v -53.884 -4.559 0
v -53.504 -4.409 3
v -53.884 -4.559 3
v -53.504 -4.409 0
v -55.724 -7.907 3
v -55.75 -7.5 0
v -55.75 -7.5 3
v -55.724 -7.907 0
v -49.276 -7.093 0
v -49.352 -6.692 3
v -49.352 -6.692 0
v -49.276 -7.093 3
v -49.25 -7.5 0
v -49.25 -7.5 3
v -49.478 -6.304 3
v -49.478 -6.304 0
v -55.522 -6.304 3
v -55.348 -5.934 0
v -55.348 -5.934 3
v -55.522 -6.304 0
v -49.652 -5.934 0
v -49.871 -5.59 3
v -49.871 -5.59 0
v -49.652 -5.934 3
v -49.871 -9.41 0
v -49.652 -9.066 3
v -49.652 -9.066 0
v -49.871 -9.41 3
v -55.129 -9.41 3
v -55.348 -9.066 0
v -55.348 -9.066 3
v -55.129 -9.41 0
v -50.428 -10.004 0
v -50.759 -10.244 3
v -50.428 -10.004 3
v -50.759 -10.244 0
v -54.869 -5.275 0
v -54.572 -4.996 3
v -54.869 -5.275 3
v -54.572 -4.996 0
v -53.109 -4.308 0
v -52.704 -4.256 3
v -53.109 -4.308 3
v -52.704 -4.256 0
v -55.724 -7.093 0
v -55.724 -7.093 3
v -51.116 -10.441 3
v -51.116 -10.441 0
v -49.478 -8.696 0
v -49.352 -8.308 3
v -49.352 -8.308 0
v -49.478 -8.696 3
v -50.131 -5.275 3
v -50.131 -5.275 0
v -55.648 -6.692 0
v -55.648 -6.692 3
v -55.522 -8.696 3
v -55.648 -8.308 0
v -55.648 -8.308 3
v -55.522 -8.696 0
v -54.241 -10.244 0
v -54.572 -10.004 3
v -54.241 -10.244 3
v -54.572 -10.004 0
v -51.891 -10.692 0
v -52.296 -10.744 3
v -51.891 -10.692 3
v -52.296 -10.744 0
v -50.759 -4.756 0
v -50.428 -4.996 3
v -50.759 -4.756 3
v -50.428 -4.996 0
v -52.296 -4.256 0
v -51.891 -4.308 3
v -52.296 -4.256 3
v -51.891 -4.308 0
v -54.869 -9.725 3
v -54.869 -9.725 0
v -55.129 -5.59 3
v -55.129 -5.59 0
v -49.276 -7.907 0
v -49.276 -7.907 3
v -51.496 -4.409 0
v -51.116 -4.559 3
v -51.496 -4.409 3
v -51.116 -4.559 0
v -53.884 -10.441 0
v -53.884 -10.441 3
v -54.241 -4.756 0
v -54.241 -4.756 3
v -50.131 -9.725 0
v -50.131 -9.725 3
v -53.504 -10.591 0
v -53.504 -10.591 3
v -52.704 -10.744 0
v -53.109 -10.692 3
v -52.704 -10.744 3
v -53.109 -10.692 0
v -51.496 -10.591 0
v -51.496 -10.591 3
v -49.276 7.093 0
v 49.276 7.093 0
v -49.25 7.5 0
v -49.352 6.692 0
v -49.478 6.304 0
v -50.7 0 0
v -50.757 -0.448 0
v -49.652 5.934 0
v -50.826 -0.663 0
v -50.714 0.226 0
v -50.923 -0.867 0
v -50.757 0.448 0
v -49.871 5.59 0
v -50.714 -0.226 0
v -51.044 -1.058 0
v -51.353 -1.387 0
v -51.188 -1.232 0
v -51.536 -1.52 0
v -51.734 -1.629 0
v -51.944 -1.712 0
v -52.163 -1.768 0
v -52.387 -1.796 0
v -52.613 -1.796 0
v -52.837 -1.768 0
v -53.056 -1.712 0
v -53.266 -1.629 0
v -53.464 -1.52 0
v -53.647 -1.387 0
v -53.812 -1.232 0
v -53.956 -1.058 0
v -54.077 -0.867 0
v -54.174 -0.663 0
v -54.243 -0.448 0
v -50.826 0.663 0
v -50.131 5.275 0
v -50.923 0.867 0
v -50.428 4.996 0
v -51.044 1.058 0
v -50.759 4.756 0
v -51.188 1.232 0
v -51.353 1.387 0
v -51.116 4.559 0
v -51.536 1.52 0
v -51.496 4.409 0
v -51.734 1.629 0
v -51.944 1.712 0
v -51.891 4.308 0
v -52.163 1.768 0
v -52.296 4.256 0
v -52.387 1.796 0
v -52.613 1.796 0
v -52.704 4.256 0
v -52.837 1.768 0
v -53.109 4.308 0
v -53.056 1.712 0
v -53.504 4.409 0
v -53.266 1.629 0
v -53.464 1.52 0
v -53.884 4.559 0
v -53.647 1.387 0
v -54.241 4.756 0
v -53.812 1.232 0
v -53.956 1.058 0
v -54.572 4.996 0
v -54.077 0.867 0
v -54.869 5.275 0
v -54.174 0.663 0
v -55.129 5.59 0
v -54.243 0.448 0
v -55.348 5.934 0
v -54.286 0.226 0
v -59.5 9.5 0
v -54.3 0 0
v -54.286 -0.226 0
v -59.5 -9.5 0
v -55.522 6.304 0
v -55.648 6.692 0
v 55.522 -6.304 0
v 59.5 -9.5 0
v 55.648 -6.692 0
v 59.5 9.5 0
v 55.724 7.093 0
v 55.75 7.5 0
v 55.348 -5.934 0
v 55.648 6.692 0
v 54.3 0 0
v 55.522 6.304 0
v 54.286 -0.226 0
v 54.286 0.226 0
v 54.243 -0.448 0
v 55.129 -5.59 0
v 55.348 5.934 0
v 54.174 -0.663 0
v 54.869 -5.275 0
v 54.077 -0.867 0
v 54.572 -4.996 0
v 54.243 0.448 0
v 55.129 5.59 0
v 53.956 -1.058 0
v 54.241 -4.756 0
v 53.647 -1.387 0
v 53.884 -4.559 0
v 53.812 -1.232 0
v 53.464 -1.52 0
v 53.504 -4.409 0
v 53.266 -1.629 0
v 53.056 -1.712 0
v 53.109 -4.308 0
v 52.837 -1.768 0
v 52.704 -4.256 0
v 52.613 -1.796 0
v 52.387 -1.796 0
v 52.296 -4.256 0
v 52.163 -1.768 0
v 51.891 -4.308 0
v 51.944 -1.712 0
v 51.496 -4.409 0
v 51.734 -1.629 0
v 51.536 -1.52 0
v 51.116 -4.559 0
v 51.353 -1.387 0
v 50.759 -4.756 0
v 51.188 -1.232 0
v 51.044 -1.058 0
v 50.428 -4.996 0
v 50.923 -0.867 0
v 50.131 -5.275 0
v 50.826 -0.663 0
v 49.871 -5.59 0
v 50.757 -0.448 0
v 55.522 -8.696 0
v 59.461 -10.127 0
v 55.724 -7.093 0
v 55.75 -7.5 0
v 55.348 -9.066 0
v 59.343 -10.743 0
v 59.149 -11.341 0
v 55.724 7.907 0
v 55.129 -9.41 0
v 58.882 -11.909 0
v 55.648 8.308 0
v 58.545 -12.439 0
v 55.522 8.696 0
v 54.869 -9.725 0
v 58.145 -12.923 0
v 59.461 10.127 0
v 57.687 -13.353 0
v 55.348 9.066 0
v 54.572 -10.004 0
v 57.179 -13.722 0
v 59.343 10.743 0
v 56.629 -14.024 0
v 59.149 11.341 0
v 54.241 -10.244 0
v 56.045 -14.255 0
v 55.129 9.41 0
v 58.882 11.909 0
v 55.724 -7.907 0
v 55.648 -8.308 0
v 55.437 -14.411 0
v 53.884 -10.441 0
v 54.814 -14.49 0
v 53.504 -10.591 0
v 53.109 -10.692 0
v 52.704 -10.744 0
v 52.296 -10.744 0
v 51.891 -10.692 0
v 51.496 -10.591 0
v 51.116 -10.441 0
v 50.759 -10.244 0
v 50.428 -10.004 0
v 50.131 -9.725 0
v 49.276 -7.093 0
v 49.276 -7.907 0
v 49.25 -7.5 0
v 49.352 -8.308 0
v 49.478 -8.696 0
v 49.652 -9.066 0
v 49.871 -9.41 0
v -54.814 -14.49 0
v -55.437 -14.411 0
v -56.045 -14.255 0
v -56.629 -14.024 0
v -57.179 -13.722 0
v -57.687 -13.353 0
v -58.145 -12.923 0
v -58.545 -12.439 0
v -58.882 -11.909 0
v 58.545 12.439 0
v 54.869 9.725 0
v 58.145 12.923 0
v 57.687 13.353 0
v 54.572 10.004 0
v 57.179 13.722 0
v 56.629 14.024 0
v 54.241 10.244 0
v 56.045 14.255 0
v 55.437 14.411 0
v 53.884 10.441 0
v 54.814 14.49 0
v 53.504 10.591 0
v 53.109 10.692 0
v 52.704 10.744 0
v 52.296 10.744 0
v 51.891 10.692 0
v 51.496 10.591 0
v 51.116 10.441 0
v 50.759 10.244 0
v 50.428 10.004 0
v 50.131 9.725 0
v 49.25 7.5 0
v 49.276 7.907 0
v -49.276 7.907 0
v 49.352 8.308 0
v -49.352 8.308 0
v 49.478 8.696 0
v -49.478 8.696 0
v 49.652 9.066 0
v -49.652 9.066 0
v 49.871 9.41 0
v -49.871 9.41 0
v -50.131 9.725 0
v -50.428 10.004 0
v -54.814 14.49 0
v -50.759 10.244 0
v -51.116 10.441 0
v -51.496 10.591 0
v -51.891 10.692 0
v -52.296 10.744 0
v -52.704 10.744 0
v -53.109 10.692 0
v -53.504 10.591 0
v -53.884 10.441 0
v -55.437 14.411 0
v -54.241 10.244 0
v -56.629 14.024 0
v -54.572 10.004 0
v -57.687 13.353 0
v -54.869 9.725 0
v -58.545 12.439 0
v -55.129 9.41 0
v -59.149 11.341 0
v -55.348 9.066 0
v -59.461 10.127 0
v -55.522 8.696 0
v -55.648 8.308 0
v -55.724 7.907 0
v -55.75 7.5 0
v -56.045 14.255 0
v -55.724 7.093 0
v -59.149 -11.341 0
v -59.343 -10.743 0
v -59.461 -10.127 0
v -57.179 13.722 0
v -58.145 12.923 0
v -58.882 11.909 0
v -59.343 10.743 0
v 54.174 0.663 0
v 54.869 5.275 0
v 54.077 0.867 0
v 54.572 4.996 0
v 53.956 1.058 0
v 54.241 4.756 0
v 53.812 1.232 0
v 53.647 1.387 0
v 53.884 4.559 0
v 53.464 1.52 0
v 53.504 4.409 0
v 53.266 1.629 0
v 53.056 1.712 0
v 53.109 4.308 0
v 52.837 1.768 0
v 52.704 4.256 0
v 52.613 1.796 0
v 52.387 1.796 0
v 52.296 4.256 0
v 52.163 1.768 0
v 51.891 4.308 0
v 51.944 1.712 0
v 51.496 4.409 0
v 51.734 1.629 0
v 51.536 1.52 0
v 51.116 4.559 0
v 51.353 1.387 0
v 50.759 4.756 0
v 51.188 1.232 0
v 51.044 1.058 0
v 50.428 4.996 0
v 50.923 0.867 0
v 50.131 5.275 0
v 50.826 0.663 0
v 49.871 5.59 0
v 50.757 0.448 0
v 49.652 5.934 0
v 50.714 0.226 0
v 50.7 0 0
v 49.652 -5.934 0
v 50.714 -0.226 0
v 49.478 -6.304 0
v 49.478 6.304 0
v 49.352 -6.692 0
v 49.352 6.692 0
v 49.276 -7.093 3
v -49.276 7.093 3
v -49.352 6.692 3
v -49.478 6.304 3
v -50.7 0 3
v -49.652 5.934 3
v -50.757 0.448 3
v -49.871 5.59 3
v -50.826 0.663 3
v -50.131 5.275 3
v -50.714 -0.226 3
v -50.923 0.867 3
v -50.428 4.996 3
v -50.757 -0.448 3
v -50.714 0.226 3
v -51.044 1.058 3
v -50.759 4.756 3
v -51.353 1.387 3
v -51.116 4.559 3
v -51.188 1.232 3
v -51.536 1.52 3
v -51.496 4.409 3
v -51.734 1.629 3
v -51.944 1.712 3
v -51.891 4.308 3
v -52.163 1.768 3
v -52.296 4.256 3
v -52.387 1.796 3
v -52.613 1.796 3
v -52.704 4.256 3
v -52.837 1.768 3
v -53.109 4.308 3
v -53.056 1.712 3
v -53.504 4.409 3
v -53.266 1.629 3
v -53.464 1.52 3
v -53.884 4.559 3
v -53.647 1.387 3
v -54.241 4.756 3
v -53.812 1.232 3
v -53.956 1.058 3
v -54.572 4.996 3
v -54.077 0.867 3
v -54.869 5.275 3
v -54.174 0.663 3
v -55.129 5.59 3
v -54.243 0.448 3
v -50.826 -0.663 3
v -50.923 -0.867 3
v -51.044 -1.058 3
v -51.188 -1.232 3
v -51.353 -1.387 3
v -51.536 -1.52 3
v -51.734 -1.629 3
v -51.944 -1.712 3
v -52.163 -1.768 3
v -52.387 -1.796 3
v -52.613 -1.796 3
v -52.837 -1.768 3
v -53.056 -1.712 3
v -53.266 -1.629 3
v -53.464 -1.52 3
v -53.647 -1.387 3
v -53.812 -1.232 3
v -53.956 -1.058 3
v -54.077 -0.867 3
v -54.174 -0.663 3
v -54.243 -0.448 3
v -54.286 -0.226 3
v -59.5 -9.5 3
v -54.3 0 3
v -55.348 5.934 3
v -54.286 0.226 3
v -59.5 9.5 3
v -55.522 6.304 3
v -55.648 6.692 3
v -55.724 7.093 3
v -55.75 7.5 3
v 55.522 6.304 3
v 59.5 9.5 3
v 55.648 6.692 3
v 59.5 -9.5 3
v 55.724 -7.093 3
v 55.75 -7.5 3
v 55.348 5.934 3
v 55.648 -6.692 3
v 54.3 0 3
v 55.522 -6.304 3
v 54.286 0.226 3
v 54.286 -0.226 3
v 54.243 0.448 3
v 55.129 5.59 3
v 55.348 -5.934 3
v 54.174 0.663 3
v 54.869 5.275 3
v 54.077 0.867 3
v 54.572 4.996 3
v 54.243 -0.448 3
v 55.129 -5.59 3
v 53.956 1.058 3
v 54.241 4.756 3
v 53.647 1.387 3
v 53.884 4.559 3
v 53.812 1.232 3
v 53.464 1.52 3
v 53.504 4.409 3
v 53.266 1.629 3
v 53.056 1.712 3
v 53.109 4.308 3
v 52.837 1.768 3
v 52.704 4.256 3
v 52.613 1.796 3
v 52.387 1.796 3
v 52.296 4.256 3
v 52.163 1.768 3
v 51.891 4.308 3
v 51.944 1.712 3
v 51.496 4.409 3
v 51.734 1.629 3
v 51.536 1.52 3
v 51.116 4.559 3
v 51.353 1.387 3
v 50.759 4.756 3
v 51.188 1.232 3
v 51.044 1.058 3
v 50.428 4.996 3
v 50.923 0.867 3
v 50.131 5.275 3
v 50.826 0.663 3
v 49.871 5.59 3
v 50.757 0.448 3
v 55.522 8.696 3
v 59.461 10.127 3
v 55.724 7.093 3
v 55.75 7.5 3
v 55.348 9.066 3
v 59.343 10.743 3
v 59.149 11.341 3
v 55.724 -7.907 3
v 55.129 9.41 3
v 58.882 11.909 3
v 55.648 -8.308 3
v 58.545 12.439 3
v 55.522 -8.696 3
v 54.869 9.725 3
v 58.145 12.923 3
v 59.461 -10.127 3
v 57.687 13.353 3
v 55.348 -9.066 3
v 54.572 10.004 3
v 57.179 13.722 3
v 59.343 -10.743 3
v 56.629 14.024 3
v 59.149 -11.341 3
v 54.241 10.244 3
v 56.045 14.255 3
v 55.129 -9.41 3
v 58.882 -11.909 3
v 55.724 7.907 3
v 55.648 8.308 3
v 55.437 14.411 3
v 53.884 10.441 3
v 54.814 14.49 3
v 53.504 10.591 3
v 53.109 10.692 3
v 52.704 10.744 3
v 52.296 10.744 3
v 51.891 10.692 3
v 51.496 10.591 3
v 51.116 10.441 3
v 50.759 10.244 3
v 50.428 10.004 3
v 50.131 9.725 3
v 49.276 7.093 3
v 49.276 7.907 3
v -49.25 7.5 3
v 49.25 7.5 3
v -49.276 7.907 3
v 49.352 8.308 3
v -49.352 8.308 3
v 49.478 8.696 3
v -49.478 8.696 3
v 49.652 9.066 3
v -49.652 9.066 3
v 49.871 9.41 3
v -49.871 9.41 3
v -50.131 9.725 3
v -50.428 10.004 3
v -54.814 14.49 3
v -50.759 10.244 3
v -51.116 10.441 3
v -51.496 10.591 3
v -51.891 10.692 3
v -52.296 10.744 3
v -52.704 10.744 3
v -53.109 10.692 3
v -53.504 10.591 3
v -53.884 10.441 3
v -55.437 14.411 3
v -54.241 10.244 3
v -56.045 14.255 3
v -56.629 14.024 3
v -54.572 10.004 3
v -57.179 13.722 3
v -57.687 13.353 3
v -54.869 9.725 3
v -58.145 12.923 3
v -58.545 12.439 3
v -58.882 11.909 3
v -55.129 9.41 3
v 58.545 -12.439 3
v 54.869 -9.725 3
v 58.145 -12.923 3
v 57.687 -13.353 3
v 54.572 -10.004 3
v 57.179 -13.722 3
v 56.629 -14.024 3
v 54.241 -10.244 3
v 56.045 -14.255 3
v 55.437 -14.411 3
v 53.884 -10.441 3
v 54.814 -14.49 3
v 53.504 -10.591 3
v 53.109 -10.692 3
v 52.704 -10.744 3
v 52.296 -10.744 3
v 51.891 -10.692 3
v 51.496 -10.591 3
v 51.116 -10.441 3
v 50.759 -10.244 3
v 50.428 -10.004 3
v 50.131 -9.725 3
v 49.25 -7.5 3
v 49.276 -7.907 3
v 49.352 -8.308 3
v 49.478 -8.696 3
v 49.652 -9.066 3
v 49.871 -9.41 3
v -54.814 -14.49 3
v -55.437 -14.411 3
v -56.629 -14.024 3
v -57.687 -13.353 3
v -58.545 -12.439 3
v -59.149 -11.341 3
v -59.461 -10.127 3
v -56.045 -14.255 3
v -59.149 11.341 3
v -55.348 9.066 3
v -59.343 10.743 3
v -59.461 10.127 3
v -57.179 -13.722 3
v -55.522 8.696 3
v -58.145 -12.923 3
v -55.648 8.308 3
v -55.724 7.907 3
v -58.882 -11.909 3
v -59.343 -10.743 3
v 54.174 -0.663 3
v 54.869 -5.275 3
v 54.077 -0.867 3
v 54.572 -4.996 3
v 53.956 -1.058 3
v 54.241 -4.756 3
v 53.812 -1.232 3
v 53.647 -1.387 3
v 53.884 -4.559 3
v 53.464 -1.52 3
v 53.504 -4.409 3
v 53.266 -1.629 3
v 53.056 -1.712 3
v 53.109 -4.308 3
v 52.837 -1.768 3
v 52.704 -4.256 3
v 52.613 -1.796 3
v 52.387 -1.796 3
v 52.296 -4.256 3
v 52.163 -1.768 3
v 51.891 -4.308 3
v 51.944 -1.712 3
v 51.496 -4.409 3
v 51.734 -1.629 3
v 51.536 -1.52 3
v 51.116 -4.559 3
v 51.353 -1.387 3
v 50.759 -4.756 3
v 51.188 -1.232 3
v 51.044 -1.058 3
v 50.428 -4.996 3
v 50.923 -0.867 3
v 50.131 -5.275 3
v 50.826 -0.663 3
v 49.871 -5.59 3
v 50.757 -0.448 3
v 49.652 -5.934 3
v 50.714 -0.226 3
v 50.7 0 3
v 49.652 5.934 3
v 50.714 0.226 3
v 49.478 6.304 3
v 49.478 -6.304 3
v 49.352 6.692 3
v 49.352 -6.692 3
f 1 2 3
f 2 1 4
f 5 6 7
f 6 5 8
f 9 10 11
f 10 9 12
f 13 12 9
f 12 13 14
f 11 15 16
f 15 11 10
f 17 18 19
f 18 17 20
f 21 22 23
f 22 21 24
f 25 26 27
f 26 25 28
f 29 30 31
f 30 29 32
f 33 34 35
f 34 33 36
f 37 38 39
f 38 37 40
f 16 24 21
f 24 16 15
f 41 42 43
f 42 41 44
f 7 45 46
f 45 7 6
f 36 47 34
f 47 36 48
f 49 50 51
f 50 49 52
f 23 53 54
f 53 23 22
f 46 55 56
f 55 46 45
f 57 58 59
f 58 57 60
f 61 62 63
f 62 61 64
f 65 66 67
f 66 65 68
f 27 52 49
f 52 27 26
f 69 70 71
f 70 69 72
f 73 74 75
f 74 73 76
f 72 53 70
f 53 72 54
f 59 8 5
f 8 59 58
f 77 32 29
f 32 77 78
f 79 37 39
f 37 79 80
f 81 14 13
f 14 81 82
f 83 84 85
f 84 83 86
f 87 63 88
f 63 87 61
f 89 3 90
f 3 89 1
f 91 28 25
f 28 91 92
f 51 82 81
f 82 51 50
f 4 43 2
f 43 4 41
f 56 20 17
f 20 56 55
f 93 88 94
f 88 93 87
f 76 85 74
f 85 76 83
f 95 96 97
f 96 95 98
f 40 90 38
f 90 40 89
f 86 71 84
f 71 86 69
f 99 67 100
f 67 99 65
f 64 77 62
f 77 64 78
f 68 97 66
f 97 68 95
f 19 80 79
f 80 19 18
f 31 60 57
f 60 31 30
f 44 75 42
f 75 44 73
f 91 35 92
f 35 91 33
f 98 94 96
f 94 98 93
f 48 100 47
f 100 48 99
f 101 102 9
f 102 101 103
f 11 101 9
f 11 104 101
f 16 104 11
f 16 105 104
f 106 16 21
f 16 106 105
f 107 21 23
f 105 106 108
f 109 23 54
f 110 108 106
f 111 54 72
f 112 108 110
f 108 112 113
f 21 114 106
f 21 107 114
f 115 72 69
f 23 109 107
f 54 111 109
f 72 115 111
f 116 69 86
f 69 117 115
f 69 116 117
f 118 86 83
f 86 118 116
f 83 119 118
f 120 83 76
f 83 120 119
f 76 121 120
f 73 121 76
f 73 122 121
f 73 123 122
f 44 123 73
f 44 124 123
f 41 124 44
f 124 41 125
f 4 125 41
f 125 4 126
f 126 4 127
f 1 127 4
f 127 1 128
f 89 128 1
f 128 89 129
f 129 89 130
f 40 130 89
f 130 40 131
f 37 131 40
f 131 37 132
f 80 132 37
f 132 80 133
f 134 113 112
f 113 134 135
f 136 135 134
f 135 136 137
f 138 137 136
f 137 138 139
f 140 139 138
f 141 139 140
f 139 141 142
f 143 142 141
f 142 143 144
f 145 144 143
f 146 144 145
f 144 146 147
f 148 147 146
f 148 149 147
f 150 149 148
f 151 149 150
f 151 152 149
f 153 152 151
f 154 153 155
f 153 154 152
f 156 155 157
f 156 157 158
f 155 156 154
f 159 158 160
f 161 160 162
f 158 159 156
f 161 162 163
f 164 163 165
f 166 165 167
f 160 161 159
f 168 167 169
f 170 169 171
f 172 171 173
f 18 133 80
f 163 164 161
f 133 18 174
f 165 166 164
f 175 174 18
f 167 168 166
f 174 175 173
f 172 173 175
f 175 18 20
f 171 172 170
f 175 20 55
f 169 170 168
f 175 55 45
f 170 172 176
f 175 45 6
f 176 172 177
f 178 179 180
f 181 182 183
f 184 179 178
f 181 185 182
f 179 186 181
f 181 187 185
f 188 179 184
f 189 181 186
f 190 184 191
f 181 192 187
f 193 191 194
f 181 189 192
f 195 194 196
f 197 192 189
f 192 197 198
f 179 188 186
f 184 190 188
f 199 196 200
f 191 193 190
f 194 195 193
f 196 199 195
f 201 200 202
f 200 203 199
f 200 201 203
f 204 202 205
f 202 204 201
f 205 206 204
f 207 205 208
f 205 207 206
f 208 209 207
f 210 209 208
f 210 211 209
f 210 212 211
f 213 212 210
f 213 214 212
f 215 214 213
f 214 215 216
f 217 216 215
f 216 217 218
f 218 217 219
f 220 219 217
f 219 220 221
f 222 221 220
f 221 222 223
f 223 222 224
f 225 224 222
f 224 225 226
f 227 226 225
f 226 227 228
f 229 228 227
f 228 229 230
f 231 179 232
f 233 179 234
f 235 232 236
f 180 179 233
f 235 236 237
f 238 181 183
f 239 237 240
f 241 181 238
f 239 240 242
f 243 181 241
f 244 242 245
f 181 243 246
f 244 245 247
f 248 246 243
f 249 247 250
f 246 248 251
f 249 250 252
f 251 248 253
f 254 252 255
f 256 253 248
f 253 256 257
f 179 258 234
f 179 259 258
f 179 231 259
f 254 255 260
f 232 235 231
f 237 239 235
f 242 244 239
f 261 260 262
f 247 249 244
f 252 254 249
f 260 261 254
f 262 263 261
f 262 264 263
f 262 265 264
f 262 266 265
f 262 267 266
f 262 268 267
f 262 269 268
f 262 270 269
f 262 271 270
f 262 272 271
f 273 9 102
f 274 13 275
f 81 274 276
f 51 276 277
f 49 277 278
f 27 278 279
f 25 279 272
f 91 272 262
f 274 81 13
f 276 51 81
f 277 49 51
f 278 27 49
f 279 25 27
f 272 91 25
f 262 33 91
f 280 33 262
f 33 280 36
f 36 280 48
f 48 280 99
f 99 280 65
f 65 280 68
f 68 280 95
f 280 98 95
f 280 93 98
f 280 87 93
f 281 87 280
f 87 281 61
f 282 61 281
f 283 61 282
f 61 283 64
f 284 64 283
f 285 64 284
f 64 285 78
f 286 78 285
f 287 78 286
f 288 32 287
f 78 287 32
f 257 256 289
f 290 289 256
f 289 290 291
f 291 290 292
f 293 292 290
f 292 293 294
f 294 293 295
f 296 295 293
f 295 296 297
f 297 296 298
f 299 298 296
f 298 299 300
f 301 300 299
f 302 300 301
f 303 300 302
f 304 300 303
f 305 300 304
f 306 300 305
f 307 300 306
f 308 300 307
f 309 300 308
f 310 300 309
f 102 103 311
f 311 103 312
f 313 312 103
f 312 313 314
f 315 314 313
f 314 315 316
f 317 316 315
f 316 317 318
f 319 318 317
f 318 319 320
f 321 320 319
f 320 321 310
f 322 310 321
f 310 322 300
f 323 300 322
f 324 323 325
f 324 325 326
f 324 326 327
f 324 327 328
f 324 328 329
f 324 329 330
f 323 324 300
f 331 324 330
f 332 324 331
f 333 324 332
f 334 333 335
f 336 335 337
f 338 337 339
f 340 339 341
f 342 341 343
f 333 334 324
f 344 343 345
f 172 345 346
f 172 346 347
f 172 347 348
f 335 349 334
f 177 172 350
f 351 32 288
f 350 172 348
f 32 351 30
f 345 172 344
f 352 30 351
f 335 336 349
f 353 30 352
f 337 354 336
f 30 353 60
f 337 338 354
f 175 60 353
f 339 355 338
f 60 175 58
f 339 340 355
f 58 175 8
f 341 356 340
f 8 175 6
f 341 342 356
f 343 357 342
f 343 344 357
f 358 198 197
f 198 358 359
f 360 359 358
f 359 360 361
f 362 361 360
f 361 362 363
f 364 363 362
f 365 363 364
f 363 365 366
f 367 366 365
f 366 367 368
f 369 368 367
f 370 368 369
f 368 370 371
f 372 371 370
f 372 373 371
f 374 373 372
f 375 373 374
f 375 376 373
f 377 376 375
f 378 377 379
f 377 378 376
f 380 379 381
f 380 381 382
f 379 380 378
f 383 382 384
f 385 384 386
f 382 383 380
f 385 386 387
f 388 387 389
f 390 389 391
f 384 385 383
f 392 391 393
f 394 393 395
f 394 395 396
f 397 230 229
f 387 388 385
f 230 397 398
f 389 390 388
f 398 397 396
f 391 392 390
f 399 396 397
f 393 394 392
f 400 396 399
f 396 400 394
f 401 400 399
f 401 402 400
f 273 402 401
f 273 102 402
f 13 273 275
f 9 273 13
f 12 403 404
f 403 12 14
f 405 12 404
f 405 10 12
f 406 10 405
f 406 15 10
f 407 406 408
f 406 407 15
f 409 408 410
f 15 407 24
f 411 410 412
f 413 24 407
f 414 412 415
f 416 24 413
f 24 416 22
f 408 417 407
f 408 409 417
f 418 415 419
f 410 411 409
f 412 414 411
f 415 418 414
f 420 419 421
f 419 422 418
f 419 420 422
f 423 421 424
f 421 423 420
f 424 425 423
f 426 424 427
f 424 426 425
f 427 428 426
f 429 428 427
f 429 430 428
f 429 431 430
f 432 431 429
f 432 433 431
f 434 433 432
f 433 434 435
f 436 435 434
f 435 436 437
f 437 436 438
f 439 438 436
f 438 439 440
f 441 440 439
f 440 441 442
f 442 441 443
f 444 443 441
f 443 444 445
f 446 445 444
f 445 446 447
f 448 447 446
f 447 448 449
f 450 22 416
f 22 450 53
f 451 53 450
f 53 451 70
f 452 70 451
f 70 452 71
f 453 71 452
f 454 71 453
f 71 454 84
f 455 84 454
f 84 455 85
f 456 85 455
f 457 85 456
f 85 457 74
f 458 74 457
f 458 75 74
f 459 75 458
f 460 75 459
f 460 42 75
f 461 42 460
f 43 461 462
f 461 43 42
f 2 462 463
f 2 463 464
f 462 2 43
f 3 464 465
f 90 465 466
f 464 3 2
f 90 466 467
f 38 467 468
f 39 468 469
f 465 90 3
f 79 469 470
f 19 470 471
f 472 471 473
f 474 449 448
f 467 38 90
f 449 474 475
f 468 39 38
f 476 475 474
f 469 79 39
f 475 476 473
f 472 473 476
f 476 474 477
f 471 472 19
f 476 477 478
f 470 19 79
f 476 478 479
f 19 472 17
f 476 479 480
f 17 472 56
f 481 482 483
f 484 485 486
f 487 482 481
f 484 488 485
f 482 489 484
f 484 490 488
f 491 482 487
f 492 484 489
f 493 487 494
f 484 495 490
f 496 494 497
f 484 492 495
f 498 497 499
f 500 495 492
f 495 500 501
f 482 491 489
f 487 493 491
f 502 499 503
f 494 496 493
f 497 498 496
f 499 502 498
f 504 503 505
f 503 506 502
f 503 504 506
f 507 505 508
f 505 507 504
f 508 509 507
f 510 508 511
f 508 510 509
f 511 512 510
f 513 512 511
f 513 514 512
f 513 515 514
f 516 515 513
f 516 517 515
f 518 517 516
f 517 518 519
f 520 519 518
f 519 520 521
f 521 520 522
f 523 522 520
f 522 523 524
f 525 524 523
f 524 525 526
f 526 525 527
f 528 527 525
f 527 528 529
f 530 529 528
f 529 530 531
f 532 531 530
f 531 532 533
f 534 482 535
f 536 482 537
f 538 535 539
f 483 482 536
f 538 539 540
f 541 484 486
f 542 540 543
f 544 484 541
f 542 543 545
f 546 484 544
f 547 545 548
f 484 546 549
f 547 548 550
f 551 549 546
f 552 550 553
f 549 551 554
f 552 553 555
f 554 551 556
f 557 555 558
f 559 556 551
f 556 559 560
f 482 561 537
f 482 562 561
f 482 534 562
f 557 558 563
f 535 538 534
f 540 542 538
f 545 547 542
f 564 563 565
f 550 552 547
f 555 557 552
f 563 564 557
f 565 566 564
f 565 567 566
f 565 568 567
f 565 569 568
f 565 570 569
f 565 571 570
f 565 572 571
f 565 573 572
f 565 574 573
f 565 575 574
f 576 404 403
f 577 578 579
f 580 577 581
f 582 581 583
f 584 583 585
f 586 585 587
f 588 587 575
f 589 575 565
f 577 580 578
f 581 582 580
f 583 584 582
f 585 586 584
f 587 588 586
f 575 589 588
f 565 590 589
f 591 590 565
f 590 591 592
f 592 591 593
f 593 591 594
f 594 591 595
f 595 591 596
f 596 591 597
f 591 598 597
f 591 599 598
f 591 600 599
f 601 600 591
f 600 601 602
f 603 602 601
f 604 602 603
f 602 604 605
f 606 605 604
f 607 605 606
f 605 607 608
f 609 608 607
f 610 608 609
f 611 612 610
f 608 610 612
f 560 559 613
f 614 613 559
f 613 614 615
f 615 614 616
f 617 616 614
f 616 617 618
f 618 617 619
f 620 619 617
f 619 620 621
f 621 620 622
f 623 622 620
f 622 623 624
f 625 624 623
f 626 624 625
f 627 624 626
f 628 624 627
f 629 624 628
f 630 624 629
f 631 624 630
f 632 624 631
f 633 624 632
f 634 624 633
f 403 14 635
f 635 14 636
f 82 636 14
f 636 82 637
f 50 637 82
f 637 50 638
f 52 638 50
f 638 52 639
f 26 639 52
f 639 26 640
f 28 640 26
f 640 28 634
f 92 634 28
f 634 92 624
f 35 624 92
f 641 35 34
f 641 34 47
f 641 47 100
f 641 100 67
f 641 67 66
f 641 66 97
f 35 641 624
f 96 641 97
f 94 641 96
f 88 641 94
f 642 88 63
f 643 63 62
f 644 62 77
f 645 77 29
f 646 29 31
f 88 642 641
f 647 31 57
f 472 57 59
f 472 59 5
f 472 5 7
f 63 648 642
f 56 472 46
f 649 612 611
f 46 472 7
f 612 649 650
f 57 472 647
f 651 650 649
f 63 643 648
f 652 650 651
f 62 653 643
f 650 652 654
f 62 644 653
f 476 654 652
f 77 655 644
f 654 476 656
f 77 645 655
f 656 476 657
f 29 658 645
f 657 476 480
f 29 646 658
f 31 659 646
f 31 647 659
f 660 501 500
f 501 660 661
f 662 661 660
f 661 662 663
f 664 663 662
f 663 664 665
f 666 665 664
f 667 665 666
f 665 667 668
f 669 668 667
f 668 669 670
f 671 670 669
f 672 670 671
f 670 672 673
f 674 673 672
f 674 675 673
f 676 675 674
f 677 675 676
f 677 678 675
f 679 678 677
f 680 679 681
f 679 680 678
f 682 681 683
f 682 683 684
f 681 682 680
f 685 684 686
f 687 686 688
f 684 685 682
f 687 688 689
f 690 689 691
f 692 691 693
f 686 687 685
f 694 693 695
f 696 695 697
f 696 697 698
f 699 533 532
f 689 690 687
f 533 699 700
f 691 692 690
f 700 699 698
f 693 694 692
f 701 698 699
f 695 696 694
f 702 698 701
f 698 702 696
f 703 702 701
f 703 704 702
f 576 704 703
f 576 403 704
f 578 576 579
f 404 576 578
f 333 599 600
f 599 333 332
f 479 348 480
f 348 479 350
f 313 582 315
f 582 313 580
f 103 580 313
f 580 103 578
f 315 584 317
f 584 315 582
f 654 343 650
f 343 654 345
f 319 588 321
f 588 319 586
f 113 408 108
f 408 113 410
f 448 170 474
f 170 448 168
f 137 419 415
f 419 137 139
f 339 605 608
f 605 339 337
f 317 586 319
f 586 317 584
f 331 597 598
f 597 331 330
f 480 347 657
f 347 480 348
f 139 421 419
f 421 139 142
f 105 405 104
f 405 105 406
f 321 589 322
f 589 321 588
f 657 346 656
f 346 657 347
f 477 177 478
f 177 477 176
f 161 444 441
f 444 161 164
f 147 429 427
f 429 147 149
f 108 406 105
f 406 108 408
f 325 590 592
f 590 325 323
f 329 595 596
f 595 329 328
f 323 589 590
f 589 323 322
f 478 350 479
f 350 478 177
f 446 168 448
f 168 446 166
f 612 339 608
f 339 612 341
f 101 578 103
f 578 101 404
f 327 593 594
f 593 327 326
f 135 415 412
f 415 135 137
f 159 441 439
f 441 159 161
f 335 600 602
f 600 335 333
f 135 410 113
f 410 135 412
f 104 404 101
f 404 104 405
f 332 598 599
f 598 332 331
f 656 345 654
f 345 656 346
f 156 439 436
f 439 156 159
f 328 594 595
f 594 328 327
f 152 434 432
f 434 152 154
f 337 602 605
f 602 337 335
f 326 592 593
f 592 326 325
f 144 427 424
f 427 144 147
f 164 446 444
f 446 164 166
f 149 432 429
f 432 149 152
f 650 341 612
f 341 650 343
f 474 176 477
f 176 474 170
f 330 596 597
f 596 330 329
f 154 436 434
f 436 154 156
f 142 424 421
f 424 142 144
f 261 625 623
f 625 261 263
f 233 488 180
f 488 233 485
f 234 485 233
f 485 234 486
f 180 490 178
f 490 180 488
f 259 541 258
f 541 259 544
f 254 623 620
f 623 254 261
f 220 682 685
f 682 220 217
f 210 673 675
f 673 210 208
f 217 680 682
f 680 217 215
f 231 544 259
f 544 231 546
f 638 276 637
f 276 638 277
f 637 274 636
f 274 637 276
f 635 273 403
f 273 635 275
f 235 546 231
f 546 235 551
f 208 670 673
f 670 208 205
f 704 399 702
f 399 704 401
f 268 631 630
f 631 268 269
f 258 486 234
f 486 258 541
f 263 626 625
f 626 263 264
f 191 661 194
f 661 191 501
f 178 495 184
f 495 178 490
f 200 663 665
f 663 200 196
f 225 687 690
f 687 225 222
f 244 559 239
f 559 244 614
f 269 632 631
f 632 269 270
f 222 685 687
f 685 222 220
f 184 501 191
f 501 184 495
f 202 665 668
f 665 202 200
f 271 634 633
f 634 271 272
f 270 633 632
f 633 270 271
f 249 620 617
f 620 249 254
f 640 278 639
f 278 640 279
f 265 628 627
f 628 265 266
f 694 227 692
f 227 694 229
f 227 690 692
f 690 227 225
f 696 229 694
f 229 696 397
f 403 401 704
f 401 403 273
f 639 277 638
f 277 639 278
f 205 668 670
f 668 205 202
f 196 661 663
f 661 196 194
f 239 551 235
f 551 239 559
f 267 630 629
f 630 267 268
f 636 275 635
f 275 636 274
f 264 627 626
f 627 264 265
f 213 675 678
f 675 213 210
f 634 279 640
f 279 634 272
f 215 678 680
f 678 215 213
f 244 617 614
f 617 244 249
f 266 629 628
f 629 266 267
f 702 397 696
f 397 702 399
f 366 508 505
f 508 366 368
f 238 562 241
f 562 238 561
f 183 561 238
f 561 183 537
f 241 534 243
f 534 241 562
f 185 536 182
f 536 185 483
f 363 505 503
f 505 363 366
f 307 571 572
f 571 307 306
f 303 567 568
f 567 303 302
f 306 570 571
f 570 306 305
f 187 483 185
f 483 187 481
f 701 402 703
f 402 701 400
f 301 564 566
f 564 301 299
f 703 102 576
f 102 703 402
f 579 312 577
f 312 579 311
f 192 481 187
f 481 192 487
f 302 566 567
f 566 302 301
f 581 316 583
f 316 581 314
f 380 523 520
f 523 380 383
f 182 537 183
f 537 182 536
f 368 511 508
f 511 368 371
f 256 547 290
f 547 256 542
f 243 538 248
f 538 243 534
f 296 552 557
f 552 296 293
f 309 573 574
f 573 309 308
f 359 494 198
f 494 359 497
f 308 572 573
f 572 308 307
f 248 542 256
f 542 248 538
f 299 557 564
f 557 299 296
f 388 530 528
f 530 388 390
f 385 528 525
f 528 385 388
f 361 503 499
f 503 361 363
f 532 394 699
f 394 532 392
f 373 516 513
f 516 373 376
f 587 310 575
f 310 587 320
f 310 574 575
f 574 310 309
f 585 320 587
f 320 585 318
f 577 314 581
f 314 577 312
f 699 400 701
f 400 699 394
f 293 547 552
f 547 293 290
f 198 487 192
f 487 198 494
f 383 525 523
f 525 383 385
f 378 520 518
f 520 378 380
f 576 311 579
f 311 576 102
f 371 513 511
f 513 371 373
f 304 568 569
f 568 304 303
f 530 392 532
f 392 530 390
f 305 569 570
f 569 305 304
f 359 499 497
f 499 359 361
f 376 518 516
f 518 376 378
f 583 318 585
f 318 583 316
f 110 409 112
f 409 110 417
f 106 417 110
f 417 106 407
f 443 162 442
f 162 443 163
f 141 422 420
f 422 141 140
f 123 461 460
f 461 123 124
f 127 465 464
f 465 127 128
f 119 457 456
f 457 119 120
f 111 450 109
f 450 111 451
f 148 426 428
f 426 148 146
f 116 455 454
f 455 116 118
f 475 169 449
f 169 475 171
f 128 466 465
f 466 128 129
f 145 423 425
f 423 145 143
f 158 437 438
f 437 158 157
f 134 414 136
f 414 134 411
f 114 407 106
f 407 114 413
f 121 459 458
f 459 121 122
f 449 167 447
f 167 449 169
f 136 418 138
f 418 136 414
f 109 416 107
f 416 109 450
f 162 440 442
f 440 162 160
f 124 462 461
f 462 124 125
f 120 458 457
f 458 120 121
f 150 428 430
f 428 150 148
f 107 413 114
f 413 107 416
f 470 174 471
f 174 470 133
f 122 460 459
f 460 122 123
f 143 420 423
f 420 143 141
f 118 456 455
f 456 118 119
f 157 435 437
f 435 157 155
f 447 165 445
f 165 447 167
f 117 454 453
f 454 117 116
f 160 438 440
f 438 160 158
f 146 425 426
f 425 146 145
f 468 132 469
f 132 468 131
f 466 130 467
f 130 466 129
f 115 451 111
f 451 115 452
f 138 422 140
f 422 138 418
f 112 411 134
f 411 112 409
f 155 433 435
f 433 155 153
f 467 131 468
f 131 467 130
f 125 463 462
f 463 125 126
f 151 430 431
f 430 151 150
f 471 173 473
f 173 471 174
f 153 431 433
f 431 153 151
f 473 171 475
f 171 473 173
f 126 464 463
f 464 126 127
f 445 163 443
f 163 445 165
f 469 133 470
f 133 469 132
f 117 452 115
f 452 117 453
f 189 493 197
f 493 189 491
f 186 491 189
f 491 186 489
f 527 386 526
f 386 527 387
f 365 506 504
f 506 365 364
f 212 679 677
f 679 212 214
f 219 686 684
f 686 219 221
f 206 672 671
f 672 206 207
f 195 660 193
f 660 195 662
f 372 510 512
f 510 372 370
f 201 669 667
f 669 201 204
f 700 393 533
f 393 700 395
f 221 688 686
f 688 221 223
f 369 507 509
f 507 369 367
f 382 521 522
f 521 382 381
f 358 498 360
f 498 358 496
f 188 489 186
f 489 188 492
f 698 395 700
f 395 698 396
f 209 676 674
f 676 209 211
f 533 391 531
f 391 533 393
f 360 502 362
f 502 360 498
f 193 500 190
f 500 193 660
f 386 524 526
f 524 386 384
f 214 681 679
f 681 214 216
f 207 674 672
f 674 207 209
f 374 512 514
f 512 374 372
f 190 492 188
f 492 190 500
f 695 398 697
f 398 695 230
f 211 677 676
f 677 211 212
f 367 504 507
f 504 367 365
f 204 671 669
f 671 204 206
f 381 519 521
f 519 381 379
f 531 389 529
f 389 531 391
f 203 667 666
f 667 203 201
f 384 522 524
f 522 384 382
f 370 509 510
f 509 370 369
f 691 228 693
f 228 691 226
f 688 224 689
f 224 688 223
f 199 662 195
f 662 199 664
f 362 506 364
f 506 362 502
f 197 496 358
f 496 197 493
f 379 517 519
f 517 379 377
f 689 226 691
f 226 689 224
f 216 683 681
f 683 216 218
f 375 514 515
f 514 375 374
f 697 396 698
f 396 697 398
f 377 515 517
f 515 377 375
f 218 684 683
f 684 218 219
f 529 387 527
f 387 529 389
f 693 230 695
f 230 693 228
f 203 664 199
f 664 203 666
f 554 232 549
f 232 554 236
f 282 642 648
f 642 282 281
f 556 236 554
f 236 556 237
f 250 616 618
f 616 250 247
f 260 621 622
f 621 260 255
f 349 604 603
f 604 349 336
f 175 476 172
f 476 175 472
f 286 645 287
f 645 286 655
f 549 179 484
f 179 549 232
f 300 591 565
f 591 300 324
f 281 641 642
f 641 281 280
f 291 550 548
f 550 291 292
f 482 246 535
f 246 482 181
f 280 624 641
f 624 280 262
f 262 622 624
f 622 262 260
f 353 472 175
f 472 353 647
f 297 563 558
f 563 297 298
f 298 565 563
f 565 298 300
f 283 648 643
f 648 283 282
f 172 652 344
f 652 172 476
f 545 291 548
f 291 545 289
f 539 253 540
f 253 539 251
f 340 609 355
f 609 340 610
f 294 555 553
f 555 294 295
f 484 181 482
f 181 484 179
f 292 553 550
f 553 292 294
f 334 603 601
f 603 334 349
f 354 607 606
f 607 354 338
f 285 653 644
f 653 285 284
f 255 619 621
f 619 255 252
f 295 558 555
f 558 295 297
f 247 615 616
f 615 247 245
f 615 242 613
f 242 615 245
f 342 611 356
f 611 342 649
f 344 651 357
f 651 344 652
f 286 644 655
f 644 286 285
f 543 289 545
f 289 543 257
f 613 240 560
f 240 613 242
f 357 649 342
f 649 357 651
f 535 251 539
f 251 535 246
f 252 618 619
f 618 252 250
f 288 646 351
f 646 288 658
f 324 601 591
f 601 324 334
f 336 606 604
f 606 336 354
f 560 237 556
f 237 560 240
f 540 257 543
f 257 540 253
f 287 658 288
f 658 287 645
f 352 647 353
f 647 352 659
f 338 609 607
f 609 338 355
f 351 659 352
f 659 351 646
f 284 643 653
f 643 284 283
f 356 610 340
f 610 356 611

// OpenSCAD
$fn = 50;


difference() {
	union() {
		hull() {
			translate(v = [-54.5000000000, 9.5000000000, 0]) {
				cylinder(h = 3, r = 5);
			}
			translate(v = [54.5000000000, 9.5000000000, 0]) {
				cylinder(h = 3, r = 5);
			}
			translate(v = [-54.5000000000, -9.5000000000, 0]) {
				cylinder(h = 3, r = 5);
			}
			translate(v = [54.5000000000, -9.5000000000, 0]) {
				cylinder(h = 3, r = 5);
			}
		}
	}
	union() {
		translate(v = [-52.5000000000, -7.5000000000, 0]) {
			cylinder(h = 3, r = 3.2500000000);
		}
		translate(v = [-52.5000000000, 7.5000000000, 0]) {
			cylinder(h = 3, r = 3.2500000000);
		}
		translate(v = [52.5000000000, -7.5000000000, 0]) {
			cylinder(h = 3, r = 3.2500000000);
		}
		translate(v = [52.5000000000, 7.5000000000, 0]) {
			cylinder(h = 3, r = 3.2500000000);
		}
		translate(v = [-52.5000000000, -7.5000000000, 0]) {
			cylinder(h = 3, r = 1.8000000000);
		}
		translate(v = [-52.5000000000, 0.0000000000, 0]) {
			cylinder(h = 3, r = 1.8000000000);
		}
		translate(v = [-52.5000000000, 7.5000000000, 0]) {
			cylinder(h = 3, r = 1.8000000000);
		}
		translate(v = [52.5000000000, -7.5000000000, 0]) {
			cylinder(h = 3, r = 1.8000000000);
		}
		translate(v = [52.5000000000, 0.0000000000, 0]) {
			cylinder(h = 3, r = 1.8000000000);
		}
		translate(v = [52.5000000000, 7.5000000000, 0]) {
			cylinder(h = 3, r = 1.8000000000);
		}
		translate(v = [-52.5000000000, -7.5000000000, 0]) {
			cylinder(h = 3, r = 1.8000000000);
		}
		translate(v = [-52.5000000000, 0.0000000000, 0]) {
			cylinder(h = 3, r = 1.8000000000);
		}
		translate(v = [-52.5000000000, 7.5000000000, 0]) {
			cylinder(h = 3, r = 1.8000000000);
		}
		translate(v = [52.5000000000, -7.5000000000, 0]) {
			cylinder(h = 3, r = 1.8000000000);
		}
		translate(v = [52.5000000000, 0.0000000000, 0]) {
			cylinder(h = 3, r = 1.8000000000);
		}
		translate(v = [52.5000000000, 7.5000000000, 0]) {
			cylinder(h = 3, r = 1.8000000000);
		}
		translate(v = [-52.5000000000, -7.5000000000, 0]) {
			cylinder(h = 3, r = 1.8000000000);
		}
		translate(v = [-52.5000000000, 0.0000000000, 0]) {
			cylinder(h = 3, r = 1.8000000000);
		}
		translate(v = [-52.5000000000, 7.5000000000, 0]) {
			cylinder(h = 3, r = 1.8000000000);
		}
		translate(v = [52.5000000000, -7.5000000000, 0]) {
			cylinder(h = 3, r = 1.8000000000);
		}
		translate(v = [52.5000000000, 0.0000000000, 0]) {
			cylinder(h = 3, r = 1.8000000000);
		}
		translate(v = [52.5000000000, 7.5000000000, 0]) {
			cylinder(h = 3, r = 1.8000000000);
		}
	}
}
